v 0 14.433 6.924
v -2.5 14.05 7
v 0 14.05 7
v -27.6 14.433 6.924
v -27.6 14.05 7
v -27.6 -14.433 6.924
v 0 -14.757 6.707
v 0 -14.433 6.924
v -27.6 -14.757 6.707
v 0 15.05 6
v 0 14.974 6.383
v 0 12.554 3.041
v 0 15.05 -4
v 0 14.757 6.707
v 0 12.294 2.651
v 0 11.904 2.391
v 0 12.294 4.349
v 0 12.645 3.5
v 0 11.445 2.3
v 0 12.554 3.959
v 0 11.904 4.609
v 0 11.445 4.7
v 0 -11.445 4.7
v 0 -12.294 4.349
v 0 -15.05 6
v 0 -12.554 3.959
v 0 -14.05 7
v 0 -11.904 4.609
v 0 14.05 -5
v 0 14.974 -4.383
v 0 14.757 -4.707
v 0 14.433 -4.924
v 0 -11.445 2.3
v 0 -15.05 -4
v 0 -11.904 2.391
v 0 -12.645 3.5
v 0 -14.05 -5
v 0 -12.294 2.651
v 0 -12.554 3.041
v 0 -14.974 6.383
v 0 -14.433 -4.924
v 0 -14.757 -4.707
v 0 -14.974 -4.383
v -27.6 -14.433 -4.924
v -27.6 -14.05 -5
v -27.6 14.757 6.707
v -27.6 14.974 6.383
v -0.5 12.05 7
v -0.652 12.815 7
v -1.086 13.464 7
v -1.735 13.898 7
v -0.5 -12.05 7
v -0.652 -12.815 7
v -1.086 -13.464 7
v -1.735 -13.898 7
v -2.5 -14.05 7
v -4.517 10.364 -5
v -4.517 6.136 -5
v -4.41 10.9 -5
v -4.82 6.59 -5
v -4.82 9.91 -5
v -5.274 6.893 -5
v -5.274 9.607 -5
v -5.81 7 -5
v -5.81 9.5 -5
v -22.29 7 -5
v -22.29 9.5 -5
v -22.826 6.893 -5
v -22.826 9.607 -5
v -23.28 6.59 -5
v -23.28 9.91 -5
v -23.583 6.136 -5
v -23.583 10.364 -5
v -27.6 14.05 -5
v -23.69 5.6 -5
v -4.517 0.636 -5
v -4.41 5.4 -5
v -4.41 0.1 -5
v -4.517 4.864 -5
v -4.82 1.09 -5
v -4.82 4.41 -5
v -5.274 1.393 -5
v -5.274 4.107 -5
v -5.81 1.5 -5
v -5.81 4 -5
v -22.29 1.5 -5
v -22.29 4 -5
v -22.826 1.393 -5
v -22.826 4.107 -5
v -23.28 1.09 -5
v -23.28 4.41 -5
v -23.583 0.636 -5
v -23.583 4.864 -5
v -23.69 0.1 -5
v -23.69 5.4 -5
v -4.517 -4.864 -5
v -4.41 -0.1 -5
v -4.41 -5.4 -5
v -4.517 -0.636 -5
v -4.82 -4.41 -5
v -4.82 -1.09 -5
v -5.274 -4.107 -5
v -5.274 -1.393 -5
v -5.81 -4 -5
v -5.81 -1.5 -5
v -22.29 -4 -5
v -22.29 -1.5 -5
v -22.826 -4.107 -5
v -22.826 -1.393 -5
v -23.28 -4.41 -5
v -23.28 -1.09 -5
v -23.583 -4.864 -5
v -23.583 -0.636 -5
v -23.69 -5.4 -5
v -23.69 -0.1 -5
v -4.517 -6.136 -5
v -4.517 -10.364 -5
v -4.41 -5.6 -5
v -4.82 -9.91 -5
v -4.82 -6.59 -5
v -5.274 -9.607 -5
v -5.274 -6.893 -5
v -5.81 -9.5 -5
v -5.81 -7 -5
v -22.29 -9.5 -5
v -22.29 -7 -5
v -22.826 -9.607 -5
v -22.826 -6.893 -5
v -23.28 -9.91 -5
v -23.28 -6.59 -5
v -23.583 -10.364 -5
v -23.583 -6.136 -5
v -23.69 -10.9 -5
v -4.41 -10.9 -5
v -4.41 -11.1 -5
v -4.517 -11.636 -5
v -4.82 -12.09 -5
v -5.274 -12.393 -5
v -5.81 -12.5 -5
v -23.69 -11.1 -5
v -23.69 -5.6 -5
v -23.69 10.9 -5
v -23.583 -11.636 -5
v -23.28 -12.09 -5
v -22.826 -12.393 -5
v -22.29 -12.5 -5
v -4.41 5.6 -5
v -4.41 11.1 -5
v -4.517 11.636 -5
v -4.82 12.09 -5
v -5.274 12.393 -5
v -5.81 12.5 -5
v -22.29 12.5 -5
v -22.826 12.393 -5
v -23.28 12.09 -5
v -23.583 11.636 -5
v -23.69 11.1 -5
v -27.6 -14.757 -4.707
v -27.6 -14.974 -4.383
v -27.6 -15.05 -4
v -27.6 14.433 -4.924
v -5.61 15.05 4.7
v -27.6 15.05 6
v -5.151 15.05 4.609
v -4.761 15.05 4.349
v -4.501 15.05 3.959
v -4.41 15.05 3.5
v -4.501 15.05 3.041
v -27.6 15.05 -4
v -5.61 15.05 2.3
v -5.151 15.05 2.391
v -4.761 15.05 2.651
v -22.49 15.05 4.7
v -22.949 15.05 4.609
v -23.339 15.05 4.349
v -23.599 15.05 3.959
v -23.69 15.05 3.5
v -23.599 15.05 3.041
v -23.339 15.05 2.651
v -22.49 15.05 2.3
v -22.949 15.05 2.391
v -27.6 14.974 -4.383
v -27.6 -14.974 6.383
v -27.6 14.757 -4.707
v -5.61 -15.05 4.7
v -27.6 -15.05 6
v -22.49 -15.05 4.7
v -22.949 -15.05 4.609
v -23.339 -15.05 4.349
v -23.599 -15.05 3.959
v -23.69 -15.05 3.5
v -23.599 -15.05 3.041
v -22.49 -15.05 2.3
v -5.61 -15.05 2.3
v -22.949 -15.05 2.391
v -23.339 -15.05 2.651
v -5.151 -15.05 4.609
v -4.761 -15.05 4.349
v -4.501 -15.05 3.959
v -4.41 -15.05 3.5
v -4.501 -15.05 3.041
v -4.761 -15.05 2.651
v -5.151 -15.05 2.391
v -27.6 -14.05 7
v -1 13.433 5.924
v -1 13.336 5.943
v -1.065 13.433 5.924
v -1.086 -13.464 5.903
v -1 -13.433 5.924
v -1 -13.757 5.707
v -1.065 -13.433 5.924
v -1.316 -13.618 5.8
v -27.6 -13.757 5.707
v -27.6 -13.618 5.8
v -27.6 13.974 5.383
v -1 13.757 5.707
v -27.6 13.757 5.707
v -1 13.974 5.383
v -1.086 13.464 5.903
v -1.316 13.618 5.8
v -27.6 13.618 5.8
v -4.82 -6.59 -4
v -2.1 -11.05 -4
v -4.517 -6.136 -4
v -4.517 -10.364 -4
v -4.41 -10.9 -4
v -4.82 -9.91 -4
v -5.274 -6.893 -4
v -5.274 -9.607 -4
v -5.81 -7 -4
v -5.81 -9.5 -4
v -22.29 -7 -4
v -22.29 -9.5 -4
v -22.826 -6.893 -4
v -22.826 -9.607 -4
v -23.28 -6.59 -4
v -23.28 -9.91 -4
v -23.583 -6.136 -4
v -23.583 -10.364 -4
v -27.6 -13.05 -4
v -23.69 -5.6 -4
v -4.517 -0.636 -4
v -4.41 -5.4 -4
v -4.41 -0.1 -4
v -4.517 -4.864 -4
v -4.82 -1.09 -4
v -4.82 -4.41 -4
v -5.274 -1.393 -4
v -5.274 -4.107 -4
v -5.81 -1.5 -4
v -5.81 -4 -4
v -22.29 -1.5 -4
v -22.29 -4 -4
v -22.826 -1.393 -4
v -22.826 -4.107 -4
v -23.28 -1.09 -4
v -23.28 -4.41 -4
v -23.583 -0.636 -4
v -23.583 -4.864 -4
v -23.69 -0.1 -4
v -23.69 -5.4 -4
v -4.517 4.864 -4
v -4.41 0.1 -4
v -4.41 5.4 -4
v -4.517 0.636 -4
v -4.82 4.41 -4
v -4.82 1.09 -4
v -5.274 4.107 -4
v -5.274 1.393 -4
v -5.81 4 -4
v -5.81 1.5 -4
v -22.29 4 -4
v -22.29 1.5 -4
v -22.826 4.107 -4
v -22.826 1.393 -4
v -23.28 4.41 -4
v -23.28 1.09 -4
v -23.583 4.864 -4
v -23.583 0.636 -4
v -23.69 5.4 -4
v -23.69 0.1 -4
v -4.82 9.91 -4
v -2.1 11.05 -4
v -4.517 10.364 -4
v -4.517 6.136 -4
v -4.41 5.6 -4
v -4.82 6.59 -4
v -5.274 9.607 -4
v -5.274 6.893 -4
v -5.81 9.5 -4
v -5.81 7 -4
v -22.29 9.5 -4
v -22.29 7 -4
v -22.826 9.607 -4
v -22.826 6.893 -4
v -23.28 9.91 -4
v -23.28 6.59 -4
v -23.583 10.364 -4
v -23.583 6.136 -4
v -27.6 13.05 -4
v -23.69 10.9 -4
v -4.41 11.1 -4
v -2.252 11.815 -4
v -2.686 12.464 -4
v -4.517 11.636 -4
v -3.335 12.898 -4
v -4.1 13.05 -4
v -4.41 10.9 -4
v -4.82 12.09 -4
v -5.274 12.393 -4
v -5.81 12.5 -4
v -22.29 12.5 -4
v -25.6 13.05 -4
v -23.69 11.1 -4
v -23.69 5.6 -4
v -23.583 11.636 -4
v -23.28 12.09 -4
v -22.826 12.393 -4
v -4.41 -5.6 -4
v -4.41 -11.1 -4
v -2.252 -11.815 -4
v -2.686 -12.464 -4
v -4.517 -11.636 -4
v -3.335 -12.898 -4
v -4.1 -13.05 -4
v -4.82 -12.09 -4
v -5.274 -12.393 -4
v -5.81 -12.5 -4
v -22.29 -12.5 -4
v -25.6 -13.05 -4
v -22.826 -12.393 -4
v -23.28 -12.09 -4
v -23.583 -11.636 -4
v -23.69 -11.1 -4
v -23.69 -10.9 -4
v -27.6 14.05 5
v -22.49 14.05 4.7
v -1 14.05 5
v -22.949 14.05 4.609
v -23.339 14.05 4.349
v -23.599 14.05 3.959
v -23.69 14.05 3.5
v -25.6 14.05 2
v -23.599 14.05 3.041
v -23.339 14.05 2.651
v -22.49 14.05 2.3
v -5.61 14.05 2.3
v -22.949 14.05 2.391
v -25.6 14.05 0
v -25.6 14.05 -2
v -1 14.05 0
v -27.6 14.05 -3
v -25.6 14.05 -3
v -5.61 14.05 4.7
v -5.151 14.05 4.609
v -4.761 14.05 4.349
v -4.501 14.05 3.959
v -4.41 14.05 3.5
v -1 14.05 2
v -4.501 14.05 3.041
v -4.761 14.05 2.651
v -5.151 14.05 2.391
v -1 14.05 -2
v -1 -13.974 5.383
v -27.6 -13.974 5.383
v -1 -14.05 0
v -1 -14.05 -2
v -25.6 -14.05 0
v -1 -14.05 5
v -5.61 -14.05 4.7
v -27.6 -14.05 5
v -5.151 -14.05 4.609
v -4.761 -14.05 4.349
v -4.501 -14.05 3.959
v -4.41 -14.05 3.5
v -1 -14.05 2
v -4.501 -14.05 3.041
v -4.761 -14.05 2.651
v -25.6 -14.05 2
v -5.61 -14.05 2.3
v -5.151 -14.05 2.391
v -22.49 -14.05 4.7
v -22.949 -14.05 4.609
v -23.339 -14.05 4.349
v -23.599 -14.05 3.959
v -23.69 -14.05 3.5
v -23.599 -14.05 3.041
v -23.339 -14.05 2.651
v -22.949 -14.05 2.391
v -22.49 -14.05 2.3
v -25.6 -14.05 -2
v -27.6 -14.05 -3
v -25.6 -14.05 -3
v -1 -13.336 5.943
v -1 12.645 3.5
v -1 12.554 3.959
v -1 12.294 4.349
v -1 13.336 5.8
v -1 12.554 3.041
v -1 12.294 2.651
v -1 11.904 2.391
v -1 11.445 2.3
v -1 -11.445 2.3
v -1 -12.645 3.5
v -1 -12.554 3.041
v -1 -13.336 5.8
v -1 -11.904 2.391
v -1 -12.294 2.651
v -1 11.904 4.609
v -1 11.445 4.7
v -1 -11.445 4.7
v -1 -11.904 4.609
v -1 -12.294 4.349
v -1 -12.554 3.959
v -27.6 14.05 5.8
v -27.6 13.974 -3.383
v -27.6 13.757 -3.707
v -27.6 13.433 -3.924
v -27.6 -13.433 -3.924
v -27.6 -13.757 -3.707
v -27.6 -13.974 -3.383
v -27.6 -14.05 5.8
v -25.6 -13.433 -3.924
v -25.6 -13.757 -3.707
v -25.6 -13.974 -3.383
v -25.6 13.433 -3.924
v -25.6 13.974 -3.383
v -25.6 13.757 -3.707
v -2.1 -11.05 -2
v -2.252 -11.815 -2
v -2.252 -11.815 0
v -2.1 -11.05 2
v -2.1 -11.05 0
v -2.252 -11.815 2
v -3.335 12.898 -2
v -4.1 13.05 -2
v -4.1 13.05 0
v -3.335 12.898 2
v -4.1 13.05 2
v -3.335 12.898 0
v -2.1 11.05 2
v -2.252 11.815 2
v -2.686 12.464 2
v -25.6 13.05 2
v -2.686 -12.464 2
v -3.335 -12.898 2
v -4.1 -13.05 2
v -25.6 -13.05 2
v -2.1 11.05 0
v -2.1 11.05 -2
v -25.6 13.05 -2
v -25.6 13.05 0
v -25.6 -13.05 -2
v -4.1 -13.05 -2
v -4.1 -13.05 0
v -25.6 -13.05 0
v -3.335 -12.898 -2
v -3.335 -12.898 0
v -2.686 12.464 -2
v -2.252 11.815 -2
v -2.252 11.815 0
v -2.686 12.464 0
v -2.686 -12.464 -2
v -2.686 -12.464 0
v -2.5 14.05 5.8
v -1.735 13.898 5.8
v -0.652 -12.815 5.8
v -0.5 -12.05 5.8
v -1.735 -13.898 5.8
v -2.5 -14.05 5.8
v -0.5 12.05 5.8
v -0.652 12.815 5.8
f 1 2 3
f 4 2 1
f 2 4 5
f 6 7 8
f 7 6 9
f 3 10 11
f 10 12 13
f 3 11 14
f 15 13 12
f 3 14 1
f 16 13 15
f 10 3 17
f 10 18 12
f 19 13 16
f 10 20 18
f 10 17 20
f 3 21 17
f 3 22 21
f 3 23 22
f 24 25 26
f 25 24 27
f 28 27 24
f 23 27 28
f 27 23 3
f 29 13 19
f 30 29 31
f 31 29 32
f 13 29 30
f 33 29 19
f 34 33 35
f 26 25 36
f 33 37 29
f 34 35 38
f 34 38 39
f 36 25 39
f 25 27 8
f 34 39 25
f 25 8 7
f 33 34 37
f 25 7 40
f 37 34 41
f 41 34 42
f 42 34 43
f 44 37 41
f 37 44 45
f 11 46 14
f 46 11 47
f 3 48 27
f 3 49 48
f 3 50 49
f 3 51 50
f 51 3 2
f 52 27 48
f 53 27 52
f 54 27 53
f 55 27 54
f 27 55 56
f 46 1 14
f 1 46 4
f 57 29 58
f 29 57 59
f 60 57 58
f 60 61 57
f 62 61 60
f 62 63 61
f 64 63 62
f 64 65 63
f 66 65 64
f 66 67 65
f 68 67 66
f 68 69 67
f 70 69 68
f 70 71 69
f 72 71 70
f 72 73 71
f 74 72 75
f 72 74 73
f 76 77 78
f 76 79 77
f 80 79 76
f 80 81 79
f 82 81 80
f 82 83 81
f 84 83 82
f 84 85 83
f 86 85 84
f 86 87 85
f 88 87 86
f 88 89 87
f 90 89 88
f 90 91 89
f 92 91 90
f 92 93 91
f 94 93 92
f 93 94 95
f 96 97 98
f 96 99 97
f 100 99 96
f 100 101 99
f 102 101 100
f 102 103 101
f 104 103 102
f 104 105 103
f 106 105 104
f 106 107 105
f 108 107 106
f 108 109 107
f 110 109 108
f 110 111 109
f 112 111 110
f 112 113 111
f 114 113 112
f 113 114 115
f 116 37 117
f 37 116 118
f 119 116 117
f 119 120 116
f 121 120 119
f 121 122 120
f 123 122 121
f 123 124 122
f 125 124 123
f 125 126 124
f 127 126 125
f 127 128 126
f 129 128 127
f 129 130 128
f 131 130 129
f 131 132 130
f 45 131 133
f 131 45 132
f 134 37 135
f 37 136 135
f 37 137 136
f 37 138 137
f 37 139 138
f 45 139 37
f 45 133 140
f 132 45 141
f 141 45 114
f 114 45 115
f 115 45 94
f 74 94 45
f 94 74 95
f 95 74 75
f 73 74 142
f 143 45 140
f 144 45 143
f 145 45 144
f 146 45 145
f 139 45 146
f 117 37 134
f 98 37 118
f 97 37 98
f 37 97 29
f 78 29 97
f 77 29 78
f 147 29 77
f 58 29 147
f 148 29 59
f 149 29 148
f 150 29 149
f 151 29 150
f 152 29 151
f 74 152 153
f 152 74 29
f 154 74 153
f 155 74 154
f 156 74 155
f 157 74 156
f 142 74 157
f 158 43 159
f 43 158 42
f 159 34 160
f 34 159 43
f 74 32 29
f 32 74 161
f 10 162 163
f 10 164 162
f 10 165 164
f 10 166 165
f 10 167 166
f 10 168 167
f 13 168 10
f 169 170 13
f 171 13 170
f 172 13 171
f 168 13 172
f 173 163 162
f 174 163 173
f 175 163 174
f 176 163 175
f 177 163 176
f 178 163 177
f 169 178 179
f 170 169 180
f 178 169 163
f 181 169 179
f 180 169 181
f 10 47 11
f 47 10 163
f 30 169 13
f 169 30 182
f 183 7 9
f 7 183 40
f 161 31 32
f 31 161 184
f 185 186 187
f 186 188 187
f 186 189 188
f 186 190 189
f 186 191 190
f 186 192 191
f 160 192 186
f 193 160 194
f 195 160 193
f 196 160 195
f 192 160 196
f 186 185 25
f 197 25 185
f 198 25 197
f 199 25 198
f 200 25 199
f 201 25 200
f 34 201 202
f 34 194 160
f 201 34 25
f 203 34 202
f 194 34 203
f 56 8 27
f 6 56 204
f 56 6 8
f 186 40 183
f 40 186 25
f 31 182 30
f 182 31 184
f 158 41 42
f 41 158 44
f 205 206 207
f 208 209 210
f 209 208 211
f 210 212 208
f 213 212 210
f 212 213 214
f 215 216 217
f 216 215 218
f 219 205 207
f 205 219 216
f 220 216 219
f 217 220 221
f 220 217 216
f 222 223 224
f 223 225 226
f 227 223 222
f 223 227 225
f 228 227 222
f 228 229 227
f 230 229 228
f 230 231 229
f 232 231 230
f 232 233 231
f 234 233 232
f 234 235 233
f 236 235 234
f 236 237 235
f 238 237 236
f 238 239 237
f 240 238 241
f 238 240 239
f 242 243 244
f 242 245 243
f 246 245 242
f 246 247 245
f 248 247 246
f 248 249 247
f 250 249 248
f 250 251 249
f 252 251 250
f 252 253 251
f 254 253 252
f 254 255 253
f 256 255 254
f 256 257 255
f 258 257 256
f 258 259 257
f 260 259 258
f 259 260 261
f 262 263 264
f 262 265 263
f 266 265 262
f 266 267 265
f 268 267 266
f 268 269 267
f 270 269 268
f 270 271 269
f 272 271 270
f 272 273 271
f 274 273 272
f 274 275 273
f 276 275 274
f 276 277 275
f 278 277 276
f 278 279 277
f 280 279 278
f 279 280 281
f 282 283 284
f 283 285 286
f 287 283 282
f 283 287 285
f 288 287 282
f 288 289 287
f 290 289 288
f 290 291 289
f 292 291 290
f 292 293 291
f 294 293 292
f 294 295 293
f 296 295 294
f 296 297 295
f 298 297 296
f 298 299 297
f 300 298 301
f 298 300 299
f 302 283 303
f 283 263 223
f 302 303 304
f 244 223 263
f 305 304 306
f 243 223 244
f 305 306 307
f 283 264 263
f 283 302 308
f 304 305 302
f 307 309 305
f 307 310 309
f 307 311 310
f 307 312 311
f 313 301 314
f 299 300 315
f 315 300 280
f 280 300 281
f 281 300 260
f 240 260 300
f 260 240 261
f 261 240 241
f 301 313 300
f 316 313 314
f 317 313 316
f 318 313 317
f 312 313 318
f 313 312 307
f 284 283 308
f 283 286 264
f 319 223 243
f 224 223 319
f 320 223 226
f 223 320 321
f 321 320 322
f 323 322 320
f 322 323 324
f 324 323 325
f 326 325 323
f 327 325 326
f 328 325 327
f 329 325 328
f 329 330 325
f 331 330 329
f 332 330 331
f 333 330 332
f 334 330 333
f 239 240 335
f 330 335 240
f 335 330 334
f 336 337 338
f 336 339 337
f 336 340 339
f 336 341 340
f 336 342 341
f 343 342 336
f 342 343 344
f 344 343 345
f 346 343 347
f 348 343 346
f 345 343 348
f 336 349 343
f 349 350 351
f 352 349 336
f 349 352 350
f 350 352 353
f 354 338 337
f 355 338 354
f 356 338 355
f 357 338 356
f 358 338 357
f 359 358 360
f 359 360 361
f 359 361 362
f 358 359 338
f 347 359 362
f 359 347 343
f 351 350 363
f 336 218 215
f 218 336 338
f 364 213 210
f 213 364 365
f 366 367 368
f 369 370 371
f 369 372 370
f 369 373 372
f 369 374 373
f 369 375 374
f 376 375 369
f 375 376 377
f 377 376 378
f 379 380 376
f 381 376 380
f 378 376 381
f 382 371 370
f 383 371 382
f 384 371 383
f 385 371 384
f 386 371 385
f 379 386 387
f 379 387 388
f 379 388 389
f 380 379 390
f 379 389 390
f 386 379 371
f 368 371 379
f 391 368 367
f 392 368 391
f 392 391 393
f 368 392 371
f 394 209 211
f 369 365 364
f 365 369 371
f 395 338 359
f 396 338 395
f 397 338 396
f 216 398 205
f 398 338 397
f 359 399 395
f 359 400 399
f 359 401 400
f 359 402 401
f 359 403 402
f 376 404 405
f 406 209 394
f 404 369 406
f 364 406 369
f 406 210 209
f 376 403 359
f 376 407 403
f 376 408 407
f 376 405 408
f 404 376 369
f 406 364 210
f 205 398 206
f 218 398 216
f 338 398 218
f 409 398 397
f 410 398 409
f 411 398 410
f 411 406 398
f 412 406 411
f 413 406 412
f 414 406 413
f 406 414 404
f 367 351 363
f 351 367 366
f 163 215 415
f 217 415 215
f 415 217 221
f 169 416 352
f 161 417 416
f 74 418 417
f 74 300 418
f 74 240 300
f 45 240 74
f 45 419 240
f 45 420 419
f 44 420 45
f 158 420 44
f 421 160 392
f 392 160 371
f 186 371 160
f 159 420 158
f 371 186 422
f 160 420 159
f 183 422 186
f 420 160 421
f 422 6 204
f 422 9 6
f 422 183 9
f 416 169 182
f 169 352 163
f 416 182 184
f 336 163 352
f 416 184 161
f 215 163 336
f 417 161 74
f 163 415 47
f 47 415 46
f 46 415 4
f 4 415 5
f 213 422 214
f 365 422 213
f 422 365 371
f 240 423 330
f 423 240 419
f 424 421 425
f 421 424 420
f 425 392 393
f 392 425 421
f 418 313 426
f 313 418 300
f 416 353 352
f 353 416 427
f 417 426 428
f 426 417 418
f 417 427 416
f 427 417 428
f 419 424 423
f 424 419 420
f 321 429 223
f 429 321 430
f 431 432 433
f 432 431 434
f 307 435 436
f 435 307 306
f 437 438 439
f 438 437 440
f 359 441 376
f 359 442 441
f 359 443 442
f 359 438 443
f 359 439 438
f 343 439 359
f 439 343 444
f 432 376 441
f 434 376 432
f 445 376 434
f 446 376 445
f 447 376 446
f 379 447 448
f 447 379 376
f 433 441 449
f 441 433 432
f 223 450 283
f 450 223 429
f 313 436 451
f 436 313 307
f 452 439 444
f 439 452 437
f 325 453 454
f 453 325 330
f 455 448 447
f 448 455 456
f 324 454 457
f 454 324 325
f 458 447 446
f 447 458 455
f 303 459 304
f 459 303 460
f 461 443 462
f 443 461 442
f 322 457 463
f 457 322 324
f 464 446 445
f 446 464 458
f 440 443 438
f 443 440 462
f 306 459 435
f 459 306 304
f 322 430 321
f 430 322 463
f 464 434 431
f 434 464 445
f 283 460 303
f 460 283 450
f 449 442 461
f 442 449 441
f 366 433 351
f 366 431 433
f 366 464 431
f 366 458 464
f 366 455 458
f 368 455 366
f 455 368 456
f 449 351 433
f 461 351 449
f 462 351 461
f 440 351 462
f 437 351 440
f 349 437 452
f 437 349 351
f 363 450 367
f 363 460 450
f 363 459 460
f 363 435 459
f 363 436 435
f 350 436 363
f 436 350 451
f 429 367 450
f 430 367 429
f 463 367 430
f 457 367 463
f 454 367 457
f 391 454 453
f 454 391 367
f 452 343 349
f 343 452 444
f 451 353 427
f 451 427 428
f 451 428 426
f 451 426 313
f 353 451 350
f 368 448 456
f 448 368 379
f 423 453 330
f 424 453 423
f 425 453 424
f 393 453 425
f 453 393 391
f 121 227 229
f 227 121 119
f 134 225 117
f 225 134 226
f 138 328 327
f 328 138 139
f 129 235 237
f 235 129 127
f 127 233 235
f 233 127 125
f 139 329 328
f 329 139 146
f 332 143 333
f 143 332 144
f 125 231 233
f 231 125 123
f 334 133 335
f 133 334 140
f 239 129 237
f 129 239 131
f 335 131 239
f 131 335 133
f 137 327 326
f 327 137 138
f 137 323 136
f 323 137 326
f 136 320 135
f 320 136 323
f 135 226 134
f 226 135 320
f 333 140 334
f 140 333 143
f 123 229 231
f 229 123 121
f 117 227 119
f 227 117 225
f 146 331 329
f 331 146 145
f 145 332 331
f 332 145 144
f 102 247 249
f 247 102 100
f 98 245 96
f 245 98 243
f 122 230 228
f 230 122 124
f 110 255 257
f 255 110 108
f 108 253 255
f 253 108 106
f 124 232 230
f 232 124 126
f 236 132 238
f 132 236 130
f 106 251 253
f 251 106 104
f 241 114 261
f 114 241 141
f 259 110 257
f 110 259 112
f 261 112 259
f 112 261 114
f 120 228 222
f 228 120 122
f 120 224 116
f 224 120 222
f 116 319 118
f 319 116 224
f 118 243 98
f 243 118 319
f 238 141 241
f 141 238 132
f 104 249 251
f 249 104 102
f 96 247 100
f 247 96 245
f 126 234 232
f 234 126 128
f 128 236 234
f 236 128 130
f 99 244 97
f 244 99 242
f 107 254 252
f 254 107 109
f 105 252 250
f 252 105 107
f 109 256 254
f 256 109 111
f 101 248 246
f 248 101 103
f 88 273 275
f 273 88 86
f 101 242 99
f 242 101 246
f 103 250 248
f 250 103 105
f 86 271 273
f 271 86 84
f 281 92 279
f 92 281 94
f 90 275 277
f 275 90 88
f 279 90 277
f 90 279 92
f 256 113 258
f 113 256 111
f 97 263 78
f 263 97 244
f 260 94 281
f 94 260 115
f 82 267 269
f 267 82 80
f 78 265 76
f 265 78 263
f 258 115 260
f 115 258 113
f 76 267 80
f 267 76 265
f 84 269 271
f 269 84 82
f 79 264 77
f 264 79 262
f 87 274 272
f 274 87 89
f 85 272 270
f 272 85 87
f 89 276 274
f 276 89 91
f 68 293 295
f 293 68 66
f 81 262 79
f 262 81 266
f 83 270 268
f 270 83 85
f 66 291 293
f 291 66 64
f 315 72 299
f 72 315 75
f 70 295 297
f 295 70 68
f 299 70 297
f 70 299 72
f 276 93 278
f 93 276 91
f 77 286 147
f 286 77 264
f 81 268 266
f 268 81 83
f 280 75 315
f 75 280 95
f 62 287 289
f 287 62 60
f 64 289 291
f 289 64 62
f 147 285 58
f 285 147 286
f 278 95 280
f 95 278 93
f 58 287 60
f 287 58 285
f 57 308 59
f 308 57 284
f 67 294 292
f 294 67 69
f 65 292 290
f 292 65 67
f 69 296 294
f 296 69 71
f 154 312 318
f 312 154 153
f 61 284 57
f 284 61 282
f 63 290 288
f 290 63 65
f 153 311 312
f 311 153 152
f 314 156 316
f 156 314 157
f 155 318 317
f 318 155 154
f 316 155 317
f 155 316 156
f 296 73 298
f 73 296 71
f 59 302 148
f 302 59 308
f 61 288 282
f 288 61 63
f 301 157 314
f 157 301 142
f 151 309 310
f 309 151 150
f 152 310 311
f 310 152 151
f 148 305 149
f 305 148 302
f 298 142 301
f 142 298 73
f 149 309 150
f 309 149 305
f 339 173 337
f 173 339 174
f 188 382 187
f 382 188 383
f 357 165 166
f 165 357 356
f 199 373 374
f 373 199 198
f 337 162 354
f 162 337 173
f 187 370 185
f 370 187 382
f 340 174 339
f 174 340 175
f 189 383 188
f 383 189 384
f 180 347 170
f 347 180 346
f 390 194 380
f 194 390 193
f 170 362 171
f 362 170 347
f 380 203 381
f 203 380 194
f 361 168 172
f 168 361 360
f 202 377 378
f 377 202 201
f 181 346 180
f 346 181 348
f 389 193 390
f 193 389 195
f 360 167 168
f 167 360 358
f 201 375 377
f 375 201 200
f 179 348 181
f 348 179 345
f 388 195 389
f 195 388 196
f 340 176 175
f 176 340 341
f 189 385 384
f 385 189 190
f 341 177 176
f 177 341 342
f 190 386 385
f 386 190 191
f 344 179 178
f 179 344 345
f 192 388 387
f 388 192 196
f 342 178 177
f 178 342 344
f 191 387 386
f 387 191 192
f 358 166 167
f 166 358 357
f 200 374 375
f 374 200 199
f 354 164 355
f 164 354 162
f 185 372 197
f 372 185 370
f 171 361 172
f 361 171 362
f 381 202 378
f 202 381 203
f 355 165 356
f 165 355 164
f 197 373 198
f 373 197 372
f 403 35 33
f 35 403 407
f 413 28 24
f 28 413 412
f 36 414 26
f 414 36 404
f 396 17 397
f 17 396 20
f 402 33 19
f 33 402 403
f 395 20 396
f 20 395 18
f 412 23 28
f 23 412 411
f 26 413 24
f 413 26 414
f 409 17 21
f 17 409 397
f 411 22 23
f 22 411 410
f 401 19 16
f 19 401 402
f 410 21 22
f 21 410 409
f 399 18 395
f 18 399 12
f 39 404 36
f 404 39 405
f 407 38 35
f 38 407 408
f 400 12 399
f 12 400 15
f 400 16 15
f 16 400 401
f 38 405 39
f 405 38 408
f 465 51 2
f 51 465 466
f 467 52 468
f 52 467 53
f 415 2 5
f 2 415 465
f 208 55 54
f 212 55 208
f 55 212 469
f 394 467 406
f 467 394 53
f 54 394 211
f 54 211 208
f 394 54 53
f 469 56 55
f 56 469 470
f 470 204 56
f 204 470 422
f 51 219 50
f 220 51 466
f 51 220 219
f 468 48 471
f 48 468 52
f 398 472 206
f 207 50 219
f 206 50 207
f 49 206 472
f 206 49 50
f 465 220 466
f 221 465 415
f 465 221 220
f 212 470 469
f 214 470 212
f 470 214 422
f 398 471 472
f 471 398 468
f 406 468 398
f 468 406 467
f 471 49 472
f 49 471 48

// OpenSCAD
//
// Adafruit MAX98306 3.7W Stereo Amplifier Board Enclosure
//
// by Yasuhiro Wabiko
//
// This work is licensed under a Creative Commons Attribution 4.0 International License.
// https://creativecommons.org/licenses/by/4.0/
//

use <prim.scad>

// printer error related tweaks
//
// Recommended values:
//   - For Wood PLA, LID_ERROR=0.8, HOLD_ERROR=0.0.
//   - For PLA,      LID_ERROR=0.0, HOLD_ERROR=0.4.
LID_ERROR  = 0.8; // if the lid does not fit, make this larger. 0.1-0.4 too small
HOLD_ERROR = 0.0; // if the board holder is too loose, make this larger. 0.4 or 0.6

// inner size of the box.
// typically, (x,y) = board size, z depends on how much space you need for cabling.
//
size_x = 24+0.1;
size_y = 28+0.1;
size_z = 10;


// inner size of the box
//size_x = 24;
//size_y = 31-HOLD_ERROR;
//size_z = 17;
shell_thick = 1;
shell_extend = 2; // extension length for lid

arm_cut_y = 8;
arm_thick = 1;
arm_board_thick = 2;
arm_lo_z  = 2;
arm_up_z  = 2;
arm_up_z0 = arm_lo_z + arm_board_thick + arm_up_z/2;
arm_z     = arm_lo_z + arm_board_thick + arm_up_z;

// volume knob hole (front)
front_hole_dz = 10.5; // distance from left-bottom corner (looking from frontside)
front_hole_dy = 5.5;   // distance from left-bottom corner (looking from frontside)
front_hole_r  = 3.5;  // radius

// lid
lid_inner_x = 2;
lid_inner_thick = 1;

// other shape configurations
mink_error = 0.2; // 0.2 for normal PLA, 0.4 for wood PLA
lidinner = 2.0; // thickness of lid inner part

// further customization example: make a hole on the front surface
// coordinates are from left-bottom edge of inner space
// ***volume knob hole***
//front_hole_y=3.0;
//front_hole_z=8.0;

// a hole on the lid side
// ***cable holes***
lid_hole_y=2.3;
lid_hole_z=6;
lid_hole_r=0.9;
lid_vent_r=0.7;

// other shape parameters
thick = 0.4;  // wall thickness
mink =  0.4;  // minkowski radius
spfn =  16;   // minkowski resolution

// internal configurations
difoff   = thick+mink*3;  // offset to apply difference correctly for the inner space
lidoff   = -6; // x-offset to locate the lid
size_x_room = size_x + lidinner + mink; // size_x that lidinner takes into account. (this may or may not be necessary depending on shape of stuffing.)
WELDING= 0.4;

// render target; this is meant to be overriden by Makefile
//TARGET="default";
TARGET="body_test";

//
// top level logic
//
max98306_main();

module max98306_main(target=TARGET){
    
    if (target == "default") {
        max98306(with_vent=1);
    }

    if (target == "novent") {
        max98306(with_vent=0);
    }

    if (target == "body_only") {
        max98306(with_body=1, with_lid=0);
    }

    if (target == "body_test") {
        with_vent=1; with_print=0;
        ox = size_x + shell_thick*2;
        oy = size_y + shell_thick*2;
        oz = size_z + shell_thick*2;
        translate([-ox/2,0,0])
        max98306_unit_body_only(ox=ox, oy=oy, oz=oz, with_vent=with_vent, with_cabling=0, with_lid=1, with_shell=0, with_holder=1, with_side=0, with_print=with_print, with_open_roof=1);
    }
    
    if (target == "lid_only") {
        max98306(with_body=0, with_lid=1);
    }

    if (target == "unit_test") {
        translate([40,0,0]){
            max98306_unit(ox=40, oy=38, oz=36, with_vent=0, with_cabling=1, with_lid=0, with_shell=1, with_holder=1, with_side=1);
        }
        max98306_unit_lid_only(ox=40, oy=38, oz=36, with_vent=0, with_cabling=1, with_lid=0, with_shell=0, with_holder=0, with_hole=0, with_vent_lid=1);
    }
    
    if (target == "unit_lid_test") {
        max98306_unit_lid_only(ox=40, oy=38, oz=36, lid_thick=3, with_vent=0, with_cabling=1, with_lid=0, with_shell=0, with_holder=0, with_hole=0, with_vent_lid=1, with_arm=1);
    }
    
}


// -------------------------
// Public Modules
// -------------------------

// [Public]
// Minimum size enclosure.
//
// with_vent = { 1: with ventilation slits, 0: without ventilation slits }
// with_vent_lid = { 1: with ventilation slits on the lid, 0: without ventilation slits on the lid }
// with_lid  = { 1: render the lid, 0: does not render the lid }
// with_body = { 1: render the body, 0: does not render the body }
// with_print = { 1: print layout (models are rotated to be printable), 0: edit layout (no rotation) }
module max98306(with_vent=1, with_vent_lid=0, with_lid=1, with_body=1, with_print=1){

    ox = size_x + shell_thick*2;
    oy = size_y + shell_thick*2;
    oz = size_z + shell_thick*2;

    if (with_body) {
        translate([size_x/2+shell_thick,0,size_x/2])
         {
            rotate([0,90,0]) {
                max98306_unit_body_only(ox=ox, oy=oy, oz=oz, with_vent=with_vent, with_cabling=0, with_lid=1, with_shell=0, with_holder=1, with_side=0, with_print=with_print);
            }
        }
    }

    if (with_lid) {
            rotate([0,-90,0]) {
            max98306_unit_lid_only(ox=ox, oy=oy, oz=oz, lid_thick=shell_thick, with_vent=with_vent, with_cabling=0, with_lid=1, with_shell=0, with_holder=1, with_side=0, with_vent_lid=with_vent_lid, with_print=with_print);
        }
    }
}

// [Public]
// Variable size enclosure. Typically to be embededd in another project.
// 
// ox, oy, oz = dimension (this has to be equals to or larger than (size_x, size_y, size_z).
// with_body = { 1: render the body, 0: does not render the body }
// with_lid  = { 1: render the lid, 0: does not render the lid }
// with_vent = { 1: with ventilation slits, 0: without ventilation slits }
// with_vent_lid = { 1: with ventilation slits on the lid, 0: without ventilation slits on the lid }
// with_cabling = { 1: render a big openings on the enclosure for easier cabling, 0: without such openings }
// with_shell = { 1: render the shell (outermost enclosure that matches the requested dimension). 0: does not render the shell.}
// with_holder = { 1: render the holder to support MAX98306 board. 0: without holder (testing purpose). }
// with_side   = { 1: fill in the side space between the shell and the holder (to avoid oozing). 0: does not do that. }
// with_print = { 1: print layout (models are rotated to be printable), 0: edit layout (no rotation) }
module max98306_unit(ox, oy, oz, lid_thick=shell_thick, with_vent, with_cabling, with_lid, with_shell, with_holder, with_side=0, with_vent_lid=0, with_print=1, with_open_roof=0){
    if (with_print){
        rotate([0,90,0]) {
            //translate([-ox/2,oy/2-10,oz/2]) {
            translate([0,0,0]) {
                max98306_unit_body_only(ox=ox, oy=oy, oz=oz, with_vent=with_vent, with_cabling=with_cabling, with_lid=with_lid, with_shell=with_shell, with_holder=with_holder, with_side=with_side, with_open_roof=with_open_roof);
            }
        }
    } else {
        max98306_unit_body_only(ox=ox, oy=oy, oz=oz, with_vent=with_vent, with_cabling=with_cabling, with_lid=with_lid, with_shell=with_shell, with_holder=with_holder, with_side=with_side, with_open_roof=with_open_roof);
    }

    if (with_lid) {
        translate([-ox/2,0,0]) {
            max98306_unit_lid_only(ox=ox, oy=oy, oz=oz, lid_thick=lid_thick, with_vent=with_vent, with_cabling=with_cabling, with_lid=with_lid, with_shell=with_shell, with_holder=with_holder, with_vent_lid=with_vent_lid);
        }
    }
}

// [Public]
// Variable size enclosure(body only). Typically to be embededd in another project.
// 
// ox, oy, oz = dimension (this has to be equals to or larger than (size_x, size_y, size_z).
// with_body = { 1: render the body, 0: does not render the body }
// with_lid  = { 1: render the lid, 0: does not render the lid }
// with_vent = { 1: with ventilation slits, 0: without ventilation slits }
// with_vent_lid = { 1: with ventilation slits on the lid, 0: without ventilation slits on the lid }
// with_cabling = { 1: render a big openings on the enclosure for easier cabling, 0: without such openings }
// with_shell = { 1: render the shell (outermost enclosure that matches the requested dimension). 0: does not render the shell.}
// with_holder = { 1: render the holder to support MAX98306 board. 0: without holder (testing purpose). }
// with_side   = { 1: fill in the side space between the shell and the holder (to avoid oozing). 0: does not do that. }
// with_print = { 1: print layout (models are rotated to be printable), 0: edit layout (no rotation) }
module max98306_unit_body_only(ox, oy, oz, with_vent, with_cabling, with_lid, with_shell, with_holder, with_side=0, with_open_roof=0){
    // put holder at the left-top corner (looking from back side) = right-top corner (looking from front side)
    hx = ox/2 - size_x/2 - shell_thick;
    hy = 0;
    hz = oz/2 - size_z/2 - shell_thick;
    dz = shell_thick*with_shell;
    
    translate([0,0,0]) {
        if (with_shell) {
            difference(){
                union() {
                    max98306_shell(ox, oy, oz, shell_thick, with_vent, with_cabling);
                }
                // put the negative volume at exactly same position as holder
                translate([-shell_thick, hy, hz-dz+shell_thick]) {
                    rotate([0,0,0]) {
                        #max98306_holder_negative_volume(ox, size_y, size_z, shell_extend, shell_thick, with_vent, with_cabling);
                    }
                }
            }
        }
        if (with_holder) {
            translate([hx, hy, hz-dz]) {
                rotate([0,0,0]) {
                    max98306_holder(size_x, size_y, size_z, ox, oy, oz, shell_extend, shell_thick, with_vent=with_vent, with_cabling=with_cabling, with_side=with_side, with_open_roof=with_open_roof);
                }
            }            
        }
    }
}

// [Public]
// Variable size enclosure(lid only). Typically to be embededd in another project.
// 
// ox, oy, oz = dimension (this has to be equals to or larger than (size_x, size_y, size_z).
// with_body = { 1: render the body, 0: does not render the body }
// with_lid  = { 1: render the lid, 0: does not render the lid }
// with_vent = { 1: with ventilation slits, 0: without ventilation slits }
// with_vent_lid = { 1: with ventilation slits on the lid, 0: without ventilation slits on the lid }
// with_cabling = { 1: render a big openings on the enclosure for easier cabling, 0: without such openings }
// with_shell = { 1: render the shell (outermost enclosure that matches the requested dimension). 0: does not render the shell.}
// with_holder = { 1: render the holder to support MAX98306 board. 0: without holder (testing purpose). }
// with_side   = { 1: fill in the side space between the shell and the holder (to avoid oozing). 0: does not do that. }
// with_print = { 1: print layout (models are rotated to be printable), 0: edit layout (no rotation) }
module max98306_unit_lid_only(ox, oy, oz, lid_thick=shell_thick, with_vent, with_cabling, with_lid, with_shell, with_holder, with_hole=1, with_vent_lid=0, with_arm=0){
    // put holder at the left-top corner (looking from back side) = right-top corner (looking from front side)
    hx = ox/2 - size_x/2 - shell_thick;
    hy = 0;
    hz = oz/2 - size_z/2 - shell_thick;
    sx = size_x;
    sy = size_y;
    sz = size_z;
    st = shell_thick;

    translate([lid_thick/2,0,0]) {
        difference() {
            union() {
                // lid outer
                prim_round_xplate(lid_thick, oy, oz, 1, 16);

                // lid inner
                translate([lid_thick-WELDING,0,0]) {
                    difference(){
                        prim_round_xplate(lid_inner_x+WELDING, oy-shell_thick*2-LID_ERROR, oz-shell_thick*2-LID_ERROR, 1, 16);
                        prim_round_xplate(lid_inner_x+WELDING, oy-shell_thick*4, oz-shell_thick*4, 1, 16);
                    }
                }
            }

            union() {
                // cable holes
                if (with_hole) {
                    y3 = 6; // 3-cable width (22 AWG)
                    y2 = 4; // 2-cable width (22 AWG)
                    z1 = 3; // 1-cable height (22 AWG)

                    // audio input (3-cable)
                    translate([0, -sy/2+shell_thick*2+2+y3/2, -sz/2+shell_thick+arm_lo_z+arm_board_thick+arm_up_z]) {
                        #prim_round_xplate(st*6, y3, 3, 1, 16);
                    }
                    // power input (2-cable)
                    translate([0, y2/2, -sz/2+shell_thick+arm_lo_z+arm_board_thick+arm_up_z]) {
                        #prim_round_xplate(st*6, y2, 3, 1, 16);
                    }

                    // audio output left (2-cable)
                    translate([0, 3+y2/2, sz/2-shell_thick*2-3]) {
                        #prim_round_xplate(st*6, y2, 3, 1, 16);
                    }

                    // audio output right (2-cable)
                    translate([0, -3-y2/2, sz/2-shell_thick*2-3]) {
                        #prim_round_xplate(st*6, y2, 3, 1, 16);
                    }
                }

                // lid vent holes (4x3)
                if (with_vent_lid) {
                    for (iz=[  -0.3, 0.9, 2.1]) {
                        for (iy=[-1.8, -0.6, 0.6, 1.8]) {
                        translate([0, 6*iy, 6*iz+1]) {
                            rotate([0, 90, 0]) {
                                cylinder(h=lid_thick*2, r=2, $fn=16, center=true);
                            }
                            }
                        }
                    }
                }
            }
        }

        if (with_arm) {
            // lid inner arm (to hold the board)
            ah = ox - size_x - shell_thick*2 + lid_inner_x;
            az = oz/2-shell_thick-sz+arm_lo_z + arm_board_thick/2;
            ay = 4;
            az = 3;
            echo (ah=ah, az=az);
            translate([0, 0, 0.3*6+1]) {
                for (iy = [-1,1]) {
                    translate([0, (sy/2-shell_thick)*iy, 0]) {
                        translate([ah/2-WELDING, (-ay/2)*iy, 0]) {
                            prim_round_xplate(ah, ay, 3, 1, 16);
                        }

                        hull(){
                        for (iz = [-1,1]) {
                            translate([ah/2-WELDING, (-2/2)*iy, 2*iz]) {
                                rotate([0, 90, 0]) {
                                    cylinder(h=ah, r=1, $fn=16, center=true);
                                }
                            }
                        }
                        }
                    }
                }
            }
        }
    }
}

// -------------------------
// Private Modules
// -------------------------

module max98306_shell(ox, oy, oz, st, with_vent, with_cabling) {
    // outer shell
    difference(){
        difference(){
            prim_round_xplate(ox, oy, oz, 1, 16);
            translate([-shell_thick,0,0])
                prim_round_xplate(ox, oy-shell_thick*2, oz-shell_thick*2, 1, 16);
        }
        max98306_shell_negative_volume(ox, oy, oz, shell_thick, with_vent, with_cabling);
    }

}

module max98306_shell_negative_volume(sx, sy, sz, st, with_vent, with_cabling) {
    with_cabling_type0 = 0;
    // vent top
    if (with_cabling) {
        translate([0,0,sz/2]) {
            for (iy=[-2,-1,0,1,2]) {
                translate([0,iy*5.9,0]) {
                    if (with_cabling_type0) { 
                        prim_round_zplate0(sx*0.6, 3, st*3, 1, 16);
                    } else {
                        for (ix=[-2,-1,0,1,2]) {
                            translate([ix*5.9, 0, 0]) {
                                cylinder(h=st*4, r=1.6, $fn=16, center=true);
                            }
                        }
                    }
                }
            }
        }
    }

    // vent side
    if (!with_cabling) {
        if (with_vent) {
            translate([0,0,0]) {
                for (i=[-2,-1,0,1,2,3]) {
                    translate([0,0,i*5-2]) {
                        prim_round_yplate0(sx*0.6, sy*2, 2, 1, 16);
                    }
                }
            }
        }
    }
}


// holder extension to support lid
module max98306_lid_holder_extension(sx, sy, sz, sh, st, with_vent, with_cabling) {
    // inner holder
    translate([-sx/2-st,0,0]) {
        difference(){
            prim_round_xplate(sh*2, sy+st*2, sz+st*2, 1, 16);
            #prim_round_xplate(sh*2.5, sy, sz, 1, 16);
        }
    }
}

// holder to support MAX98306 board
module max98306_holder(sx, sy, sz, ox, oy, oz, sh, st, with_vent, with_cabling, with_side=0, with_open_roof=0) {
    dy = (oy-sy-st*2)*with_side;
    // inner holder
    translate([st/2,0,st])
        union(){
        difference(){
            union(){
                difference(){
                    prim_round_xplate(sx+st, sy+st*2+dy, sz+st*2, 1, 16);
                    translate([-st,0,0])
                        prim_round_xplate(sx+st, sy, sz, 1, 16);
                }
                if (sh > 0) { // extend shell in x-axis to support lid
                    max98306_lid_holder_extension(sx, sy, sz, sh, st, with_vent, with_cabling);
                }
                translate([WELDING,0,0]) {
                    max98306_hold_arm(sx, sy, sz, with_vent);
                }
            }
            union() {
                max98306_holder_negative_volume(sx, sy, sz, sh, st, with_vent=with_vent, with_cabling=with_cabling); // shared with shell
                max98306_holder_negative_volume_private(sx, sy, sz, sh, st, with_vent=with_vent, with_cabling=with_cabling, with_open_roof=with_open_roof); // private to holder
            }
        }
    }
}

// negative volume that could be shared with outer shell (like the front knob hole)
module max98306_holder_negative_volume(sx, sy, sz, sh, st, with_vent, with_cabling) {
    // front knob hole
//    translate([sx/2, -sy/2+front_hole_dy, -sz/2+front_hole_dz]) {
//        rotate([0,90,0]) {
//            #cylinder(r = front_hole_r*1.1, $fn = 64, h=st*4, center=true);
//        }
//    }
}

// negative volume that does not need to be shared with outer shell (like vent slits)
module max98306_holder_negative_volume_private(sx, sy, sz, sh, st, with_vent, with_cabling, with_open_roof=0) {
    // open roof
    if (with_open_roof) {
        translate([-sx/2, 0, sz/2+st]) {
            #prim_round_zplate0(sx*2, sy, st*2+WELDING, 2, 16);
        }
    }

    // open top/bottom for compo scenario
    if (with_cabling) {
        // bottom
        translate([-sx/2-shell_thick-sh, 0, -sz/2-st]) {
            #prim_round_zplate0(sx*0.8, sy*0.9, st*2+WELDING, 2, 16);
        }
        // top
        translate([-sx/2-shell_thick-sh, 0, sz/2+st]) {
            #prim_round_zplate0(sx*1.9, sy*0.9, st*2+WELDING, 2, 16);
        }
    }

    if (with_vent) {
        // side vent
        for (i=[1]) {
            translate([-st*1.5,0,i*3.5-1]) {
                #prim_round_yplate0(sx*0.8, sy+st*2+WELDING, 2.4, 1.2, 16);
            }
        }

        // top/bottom vent
        for (i=[-2,-1,0,1,2]) {
            translate([-st*1.5,i*5.5,0]) {
                #prim_round_zplate0(sx*0.8, 3, sz+st*2+WELDING, 1.4, 16);
            }
        }

        // front vent
        for (i=[1]) {
            translate([sx/2+shell_thick,0,i*3.5-1]) {
                #prim_round_xplate0(shell_thick*4, sy*0.9, 2.4, 1.2, 16);
            }
        }
    }
    
    // vent
}


module max98306_hold_arm(ox, oy, oz, with_vent){
    // for debug
    //translate([-size_x*1.6,0,0])
    {
        // 
        translate([-arm_thick, 0, -size_z/2+arm_z/2]) {
            difference(){
                // outer shell is slightly larger for WELDING (considering compo scenario)
                translate([0,0,-WELDING]) {
                    cube([size_x+WELDING*2, size_y+WELDING*2, arm_z+WELDING*2], center=true);
                }
                union(){
                    // wide open it
                    translate([-arm_thick*2,0,-WELDING]) {
                        #prim_round_zplate0(size_x+arm_thick*2, size_y-arm_thick*2, arm_z+WELDING*2, 2, 16);
                    }

                    // make board slot in the middle (in z-axis)
                    translate([-WELDING, 0, 0]) {
                        // board slot
                        cube([size_x+WELDING+WELDING*2, size_y+WELDING*1, arm_board_thick], center=true);
                        // (for debug)
                        //cube([size_x*2, size_y*2, 1], center=true);
                    }

                    // misc cuts
                    //translate([size_x/2-arm_thick-shell_thick-arm_thick, -size_y/2+arm_thick/2, arm_board_thick]) {
                    //    #cube([size_x*2,arm_up_z*2+WELDING,arm_up_z+0.01], center=true);
                    //}
                    //translate([size_x/2-arm_thick-shell_thick-arm_thick, -size_y/2+arm_thick/2+arm_cut_y/2, arm_board_thick]) {
                    //    #cube([size_x*2,arm_cut_y+shell_thick*2, arm_up_z], center=true);
                    //}
                    //translate([-size_x/2-arm_thick, 0, 0]) {
                    //    #cube([arm_thick*2, size_y*2, 8], center=true);
                    //}
                }
            }
        }
    }
}
